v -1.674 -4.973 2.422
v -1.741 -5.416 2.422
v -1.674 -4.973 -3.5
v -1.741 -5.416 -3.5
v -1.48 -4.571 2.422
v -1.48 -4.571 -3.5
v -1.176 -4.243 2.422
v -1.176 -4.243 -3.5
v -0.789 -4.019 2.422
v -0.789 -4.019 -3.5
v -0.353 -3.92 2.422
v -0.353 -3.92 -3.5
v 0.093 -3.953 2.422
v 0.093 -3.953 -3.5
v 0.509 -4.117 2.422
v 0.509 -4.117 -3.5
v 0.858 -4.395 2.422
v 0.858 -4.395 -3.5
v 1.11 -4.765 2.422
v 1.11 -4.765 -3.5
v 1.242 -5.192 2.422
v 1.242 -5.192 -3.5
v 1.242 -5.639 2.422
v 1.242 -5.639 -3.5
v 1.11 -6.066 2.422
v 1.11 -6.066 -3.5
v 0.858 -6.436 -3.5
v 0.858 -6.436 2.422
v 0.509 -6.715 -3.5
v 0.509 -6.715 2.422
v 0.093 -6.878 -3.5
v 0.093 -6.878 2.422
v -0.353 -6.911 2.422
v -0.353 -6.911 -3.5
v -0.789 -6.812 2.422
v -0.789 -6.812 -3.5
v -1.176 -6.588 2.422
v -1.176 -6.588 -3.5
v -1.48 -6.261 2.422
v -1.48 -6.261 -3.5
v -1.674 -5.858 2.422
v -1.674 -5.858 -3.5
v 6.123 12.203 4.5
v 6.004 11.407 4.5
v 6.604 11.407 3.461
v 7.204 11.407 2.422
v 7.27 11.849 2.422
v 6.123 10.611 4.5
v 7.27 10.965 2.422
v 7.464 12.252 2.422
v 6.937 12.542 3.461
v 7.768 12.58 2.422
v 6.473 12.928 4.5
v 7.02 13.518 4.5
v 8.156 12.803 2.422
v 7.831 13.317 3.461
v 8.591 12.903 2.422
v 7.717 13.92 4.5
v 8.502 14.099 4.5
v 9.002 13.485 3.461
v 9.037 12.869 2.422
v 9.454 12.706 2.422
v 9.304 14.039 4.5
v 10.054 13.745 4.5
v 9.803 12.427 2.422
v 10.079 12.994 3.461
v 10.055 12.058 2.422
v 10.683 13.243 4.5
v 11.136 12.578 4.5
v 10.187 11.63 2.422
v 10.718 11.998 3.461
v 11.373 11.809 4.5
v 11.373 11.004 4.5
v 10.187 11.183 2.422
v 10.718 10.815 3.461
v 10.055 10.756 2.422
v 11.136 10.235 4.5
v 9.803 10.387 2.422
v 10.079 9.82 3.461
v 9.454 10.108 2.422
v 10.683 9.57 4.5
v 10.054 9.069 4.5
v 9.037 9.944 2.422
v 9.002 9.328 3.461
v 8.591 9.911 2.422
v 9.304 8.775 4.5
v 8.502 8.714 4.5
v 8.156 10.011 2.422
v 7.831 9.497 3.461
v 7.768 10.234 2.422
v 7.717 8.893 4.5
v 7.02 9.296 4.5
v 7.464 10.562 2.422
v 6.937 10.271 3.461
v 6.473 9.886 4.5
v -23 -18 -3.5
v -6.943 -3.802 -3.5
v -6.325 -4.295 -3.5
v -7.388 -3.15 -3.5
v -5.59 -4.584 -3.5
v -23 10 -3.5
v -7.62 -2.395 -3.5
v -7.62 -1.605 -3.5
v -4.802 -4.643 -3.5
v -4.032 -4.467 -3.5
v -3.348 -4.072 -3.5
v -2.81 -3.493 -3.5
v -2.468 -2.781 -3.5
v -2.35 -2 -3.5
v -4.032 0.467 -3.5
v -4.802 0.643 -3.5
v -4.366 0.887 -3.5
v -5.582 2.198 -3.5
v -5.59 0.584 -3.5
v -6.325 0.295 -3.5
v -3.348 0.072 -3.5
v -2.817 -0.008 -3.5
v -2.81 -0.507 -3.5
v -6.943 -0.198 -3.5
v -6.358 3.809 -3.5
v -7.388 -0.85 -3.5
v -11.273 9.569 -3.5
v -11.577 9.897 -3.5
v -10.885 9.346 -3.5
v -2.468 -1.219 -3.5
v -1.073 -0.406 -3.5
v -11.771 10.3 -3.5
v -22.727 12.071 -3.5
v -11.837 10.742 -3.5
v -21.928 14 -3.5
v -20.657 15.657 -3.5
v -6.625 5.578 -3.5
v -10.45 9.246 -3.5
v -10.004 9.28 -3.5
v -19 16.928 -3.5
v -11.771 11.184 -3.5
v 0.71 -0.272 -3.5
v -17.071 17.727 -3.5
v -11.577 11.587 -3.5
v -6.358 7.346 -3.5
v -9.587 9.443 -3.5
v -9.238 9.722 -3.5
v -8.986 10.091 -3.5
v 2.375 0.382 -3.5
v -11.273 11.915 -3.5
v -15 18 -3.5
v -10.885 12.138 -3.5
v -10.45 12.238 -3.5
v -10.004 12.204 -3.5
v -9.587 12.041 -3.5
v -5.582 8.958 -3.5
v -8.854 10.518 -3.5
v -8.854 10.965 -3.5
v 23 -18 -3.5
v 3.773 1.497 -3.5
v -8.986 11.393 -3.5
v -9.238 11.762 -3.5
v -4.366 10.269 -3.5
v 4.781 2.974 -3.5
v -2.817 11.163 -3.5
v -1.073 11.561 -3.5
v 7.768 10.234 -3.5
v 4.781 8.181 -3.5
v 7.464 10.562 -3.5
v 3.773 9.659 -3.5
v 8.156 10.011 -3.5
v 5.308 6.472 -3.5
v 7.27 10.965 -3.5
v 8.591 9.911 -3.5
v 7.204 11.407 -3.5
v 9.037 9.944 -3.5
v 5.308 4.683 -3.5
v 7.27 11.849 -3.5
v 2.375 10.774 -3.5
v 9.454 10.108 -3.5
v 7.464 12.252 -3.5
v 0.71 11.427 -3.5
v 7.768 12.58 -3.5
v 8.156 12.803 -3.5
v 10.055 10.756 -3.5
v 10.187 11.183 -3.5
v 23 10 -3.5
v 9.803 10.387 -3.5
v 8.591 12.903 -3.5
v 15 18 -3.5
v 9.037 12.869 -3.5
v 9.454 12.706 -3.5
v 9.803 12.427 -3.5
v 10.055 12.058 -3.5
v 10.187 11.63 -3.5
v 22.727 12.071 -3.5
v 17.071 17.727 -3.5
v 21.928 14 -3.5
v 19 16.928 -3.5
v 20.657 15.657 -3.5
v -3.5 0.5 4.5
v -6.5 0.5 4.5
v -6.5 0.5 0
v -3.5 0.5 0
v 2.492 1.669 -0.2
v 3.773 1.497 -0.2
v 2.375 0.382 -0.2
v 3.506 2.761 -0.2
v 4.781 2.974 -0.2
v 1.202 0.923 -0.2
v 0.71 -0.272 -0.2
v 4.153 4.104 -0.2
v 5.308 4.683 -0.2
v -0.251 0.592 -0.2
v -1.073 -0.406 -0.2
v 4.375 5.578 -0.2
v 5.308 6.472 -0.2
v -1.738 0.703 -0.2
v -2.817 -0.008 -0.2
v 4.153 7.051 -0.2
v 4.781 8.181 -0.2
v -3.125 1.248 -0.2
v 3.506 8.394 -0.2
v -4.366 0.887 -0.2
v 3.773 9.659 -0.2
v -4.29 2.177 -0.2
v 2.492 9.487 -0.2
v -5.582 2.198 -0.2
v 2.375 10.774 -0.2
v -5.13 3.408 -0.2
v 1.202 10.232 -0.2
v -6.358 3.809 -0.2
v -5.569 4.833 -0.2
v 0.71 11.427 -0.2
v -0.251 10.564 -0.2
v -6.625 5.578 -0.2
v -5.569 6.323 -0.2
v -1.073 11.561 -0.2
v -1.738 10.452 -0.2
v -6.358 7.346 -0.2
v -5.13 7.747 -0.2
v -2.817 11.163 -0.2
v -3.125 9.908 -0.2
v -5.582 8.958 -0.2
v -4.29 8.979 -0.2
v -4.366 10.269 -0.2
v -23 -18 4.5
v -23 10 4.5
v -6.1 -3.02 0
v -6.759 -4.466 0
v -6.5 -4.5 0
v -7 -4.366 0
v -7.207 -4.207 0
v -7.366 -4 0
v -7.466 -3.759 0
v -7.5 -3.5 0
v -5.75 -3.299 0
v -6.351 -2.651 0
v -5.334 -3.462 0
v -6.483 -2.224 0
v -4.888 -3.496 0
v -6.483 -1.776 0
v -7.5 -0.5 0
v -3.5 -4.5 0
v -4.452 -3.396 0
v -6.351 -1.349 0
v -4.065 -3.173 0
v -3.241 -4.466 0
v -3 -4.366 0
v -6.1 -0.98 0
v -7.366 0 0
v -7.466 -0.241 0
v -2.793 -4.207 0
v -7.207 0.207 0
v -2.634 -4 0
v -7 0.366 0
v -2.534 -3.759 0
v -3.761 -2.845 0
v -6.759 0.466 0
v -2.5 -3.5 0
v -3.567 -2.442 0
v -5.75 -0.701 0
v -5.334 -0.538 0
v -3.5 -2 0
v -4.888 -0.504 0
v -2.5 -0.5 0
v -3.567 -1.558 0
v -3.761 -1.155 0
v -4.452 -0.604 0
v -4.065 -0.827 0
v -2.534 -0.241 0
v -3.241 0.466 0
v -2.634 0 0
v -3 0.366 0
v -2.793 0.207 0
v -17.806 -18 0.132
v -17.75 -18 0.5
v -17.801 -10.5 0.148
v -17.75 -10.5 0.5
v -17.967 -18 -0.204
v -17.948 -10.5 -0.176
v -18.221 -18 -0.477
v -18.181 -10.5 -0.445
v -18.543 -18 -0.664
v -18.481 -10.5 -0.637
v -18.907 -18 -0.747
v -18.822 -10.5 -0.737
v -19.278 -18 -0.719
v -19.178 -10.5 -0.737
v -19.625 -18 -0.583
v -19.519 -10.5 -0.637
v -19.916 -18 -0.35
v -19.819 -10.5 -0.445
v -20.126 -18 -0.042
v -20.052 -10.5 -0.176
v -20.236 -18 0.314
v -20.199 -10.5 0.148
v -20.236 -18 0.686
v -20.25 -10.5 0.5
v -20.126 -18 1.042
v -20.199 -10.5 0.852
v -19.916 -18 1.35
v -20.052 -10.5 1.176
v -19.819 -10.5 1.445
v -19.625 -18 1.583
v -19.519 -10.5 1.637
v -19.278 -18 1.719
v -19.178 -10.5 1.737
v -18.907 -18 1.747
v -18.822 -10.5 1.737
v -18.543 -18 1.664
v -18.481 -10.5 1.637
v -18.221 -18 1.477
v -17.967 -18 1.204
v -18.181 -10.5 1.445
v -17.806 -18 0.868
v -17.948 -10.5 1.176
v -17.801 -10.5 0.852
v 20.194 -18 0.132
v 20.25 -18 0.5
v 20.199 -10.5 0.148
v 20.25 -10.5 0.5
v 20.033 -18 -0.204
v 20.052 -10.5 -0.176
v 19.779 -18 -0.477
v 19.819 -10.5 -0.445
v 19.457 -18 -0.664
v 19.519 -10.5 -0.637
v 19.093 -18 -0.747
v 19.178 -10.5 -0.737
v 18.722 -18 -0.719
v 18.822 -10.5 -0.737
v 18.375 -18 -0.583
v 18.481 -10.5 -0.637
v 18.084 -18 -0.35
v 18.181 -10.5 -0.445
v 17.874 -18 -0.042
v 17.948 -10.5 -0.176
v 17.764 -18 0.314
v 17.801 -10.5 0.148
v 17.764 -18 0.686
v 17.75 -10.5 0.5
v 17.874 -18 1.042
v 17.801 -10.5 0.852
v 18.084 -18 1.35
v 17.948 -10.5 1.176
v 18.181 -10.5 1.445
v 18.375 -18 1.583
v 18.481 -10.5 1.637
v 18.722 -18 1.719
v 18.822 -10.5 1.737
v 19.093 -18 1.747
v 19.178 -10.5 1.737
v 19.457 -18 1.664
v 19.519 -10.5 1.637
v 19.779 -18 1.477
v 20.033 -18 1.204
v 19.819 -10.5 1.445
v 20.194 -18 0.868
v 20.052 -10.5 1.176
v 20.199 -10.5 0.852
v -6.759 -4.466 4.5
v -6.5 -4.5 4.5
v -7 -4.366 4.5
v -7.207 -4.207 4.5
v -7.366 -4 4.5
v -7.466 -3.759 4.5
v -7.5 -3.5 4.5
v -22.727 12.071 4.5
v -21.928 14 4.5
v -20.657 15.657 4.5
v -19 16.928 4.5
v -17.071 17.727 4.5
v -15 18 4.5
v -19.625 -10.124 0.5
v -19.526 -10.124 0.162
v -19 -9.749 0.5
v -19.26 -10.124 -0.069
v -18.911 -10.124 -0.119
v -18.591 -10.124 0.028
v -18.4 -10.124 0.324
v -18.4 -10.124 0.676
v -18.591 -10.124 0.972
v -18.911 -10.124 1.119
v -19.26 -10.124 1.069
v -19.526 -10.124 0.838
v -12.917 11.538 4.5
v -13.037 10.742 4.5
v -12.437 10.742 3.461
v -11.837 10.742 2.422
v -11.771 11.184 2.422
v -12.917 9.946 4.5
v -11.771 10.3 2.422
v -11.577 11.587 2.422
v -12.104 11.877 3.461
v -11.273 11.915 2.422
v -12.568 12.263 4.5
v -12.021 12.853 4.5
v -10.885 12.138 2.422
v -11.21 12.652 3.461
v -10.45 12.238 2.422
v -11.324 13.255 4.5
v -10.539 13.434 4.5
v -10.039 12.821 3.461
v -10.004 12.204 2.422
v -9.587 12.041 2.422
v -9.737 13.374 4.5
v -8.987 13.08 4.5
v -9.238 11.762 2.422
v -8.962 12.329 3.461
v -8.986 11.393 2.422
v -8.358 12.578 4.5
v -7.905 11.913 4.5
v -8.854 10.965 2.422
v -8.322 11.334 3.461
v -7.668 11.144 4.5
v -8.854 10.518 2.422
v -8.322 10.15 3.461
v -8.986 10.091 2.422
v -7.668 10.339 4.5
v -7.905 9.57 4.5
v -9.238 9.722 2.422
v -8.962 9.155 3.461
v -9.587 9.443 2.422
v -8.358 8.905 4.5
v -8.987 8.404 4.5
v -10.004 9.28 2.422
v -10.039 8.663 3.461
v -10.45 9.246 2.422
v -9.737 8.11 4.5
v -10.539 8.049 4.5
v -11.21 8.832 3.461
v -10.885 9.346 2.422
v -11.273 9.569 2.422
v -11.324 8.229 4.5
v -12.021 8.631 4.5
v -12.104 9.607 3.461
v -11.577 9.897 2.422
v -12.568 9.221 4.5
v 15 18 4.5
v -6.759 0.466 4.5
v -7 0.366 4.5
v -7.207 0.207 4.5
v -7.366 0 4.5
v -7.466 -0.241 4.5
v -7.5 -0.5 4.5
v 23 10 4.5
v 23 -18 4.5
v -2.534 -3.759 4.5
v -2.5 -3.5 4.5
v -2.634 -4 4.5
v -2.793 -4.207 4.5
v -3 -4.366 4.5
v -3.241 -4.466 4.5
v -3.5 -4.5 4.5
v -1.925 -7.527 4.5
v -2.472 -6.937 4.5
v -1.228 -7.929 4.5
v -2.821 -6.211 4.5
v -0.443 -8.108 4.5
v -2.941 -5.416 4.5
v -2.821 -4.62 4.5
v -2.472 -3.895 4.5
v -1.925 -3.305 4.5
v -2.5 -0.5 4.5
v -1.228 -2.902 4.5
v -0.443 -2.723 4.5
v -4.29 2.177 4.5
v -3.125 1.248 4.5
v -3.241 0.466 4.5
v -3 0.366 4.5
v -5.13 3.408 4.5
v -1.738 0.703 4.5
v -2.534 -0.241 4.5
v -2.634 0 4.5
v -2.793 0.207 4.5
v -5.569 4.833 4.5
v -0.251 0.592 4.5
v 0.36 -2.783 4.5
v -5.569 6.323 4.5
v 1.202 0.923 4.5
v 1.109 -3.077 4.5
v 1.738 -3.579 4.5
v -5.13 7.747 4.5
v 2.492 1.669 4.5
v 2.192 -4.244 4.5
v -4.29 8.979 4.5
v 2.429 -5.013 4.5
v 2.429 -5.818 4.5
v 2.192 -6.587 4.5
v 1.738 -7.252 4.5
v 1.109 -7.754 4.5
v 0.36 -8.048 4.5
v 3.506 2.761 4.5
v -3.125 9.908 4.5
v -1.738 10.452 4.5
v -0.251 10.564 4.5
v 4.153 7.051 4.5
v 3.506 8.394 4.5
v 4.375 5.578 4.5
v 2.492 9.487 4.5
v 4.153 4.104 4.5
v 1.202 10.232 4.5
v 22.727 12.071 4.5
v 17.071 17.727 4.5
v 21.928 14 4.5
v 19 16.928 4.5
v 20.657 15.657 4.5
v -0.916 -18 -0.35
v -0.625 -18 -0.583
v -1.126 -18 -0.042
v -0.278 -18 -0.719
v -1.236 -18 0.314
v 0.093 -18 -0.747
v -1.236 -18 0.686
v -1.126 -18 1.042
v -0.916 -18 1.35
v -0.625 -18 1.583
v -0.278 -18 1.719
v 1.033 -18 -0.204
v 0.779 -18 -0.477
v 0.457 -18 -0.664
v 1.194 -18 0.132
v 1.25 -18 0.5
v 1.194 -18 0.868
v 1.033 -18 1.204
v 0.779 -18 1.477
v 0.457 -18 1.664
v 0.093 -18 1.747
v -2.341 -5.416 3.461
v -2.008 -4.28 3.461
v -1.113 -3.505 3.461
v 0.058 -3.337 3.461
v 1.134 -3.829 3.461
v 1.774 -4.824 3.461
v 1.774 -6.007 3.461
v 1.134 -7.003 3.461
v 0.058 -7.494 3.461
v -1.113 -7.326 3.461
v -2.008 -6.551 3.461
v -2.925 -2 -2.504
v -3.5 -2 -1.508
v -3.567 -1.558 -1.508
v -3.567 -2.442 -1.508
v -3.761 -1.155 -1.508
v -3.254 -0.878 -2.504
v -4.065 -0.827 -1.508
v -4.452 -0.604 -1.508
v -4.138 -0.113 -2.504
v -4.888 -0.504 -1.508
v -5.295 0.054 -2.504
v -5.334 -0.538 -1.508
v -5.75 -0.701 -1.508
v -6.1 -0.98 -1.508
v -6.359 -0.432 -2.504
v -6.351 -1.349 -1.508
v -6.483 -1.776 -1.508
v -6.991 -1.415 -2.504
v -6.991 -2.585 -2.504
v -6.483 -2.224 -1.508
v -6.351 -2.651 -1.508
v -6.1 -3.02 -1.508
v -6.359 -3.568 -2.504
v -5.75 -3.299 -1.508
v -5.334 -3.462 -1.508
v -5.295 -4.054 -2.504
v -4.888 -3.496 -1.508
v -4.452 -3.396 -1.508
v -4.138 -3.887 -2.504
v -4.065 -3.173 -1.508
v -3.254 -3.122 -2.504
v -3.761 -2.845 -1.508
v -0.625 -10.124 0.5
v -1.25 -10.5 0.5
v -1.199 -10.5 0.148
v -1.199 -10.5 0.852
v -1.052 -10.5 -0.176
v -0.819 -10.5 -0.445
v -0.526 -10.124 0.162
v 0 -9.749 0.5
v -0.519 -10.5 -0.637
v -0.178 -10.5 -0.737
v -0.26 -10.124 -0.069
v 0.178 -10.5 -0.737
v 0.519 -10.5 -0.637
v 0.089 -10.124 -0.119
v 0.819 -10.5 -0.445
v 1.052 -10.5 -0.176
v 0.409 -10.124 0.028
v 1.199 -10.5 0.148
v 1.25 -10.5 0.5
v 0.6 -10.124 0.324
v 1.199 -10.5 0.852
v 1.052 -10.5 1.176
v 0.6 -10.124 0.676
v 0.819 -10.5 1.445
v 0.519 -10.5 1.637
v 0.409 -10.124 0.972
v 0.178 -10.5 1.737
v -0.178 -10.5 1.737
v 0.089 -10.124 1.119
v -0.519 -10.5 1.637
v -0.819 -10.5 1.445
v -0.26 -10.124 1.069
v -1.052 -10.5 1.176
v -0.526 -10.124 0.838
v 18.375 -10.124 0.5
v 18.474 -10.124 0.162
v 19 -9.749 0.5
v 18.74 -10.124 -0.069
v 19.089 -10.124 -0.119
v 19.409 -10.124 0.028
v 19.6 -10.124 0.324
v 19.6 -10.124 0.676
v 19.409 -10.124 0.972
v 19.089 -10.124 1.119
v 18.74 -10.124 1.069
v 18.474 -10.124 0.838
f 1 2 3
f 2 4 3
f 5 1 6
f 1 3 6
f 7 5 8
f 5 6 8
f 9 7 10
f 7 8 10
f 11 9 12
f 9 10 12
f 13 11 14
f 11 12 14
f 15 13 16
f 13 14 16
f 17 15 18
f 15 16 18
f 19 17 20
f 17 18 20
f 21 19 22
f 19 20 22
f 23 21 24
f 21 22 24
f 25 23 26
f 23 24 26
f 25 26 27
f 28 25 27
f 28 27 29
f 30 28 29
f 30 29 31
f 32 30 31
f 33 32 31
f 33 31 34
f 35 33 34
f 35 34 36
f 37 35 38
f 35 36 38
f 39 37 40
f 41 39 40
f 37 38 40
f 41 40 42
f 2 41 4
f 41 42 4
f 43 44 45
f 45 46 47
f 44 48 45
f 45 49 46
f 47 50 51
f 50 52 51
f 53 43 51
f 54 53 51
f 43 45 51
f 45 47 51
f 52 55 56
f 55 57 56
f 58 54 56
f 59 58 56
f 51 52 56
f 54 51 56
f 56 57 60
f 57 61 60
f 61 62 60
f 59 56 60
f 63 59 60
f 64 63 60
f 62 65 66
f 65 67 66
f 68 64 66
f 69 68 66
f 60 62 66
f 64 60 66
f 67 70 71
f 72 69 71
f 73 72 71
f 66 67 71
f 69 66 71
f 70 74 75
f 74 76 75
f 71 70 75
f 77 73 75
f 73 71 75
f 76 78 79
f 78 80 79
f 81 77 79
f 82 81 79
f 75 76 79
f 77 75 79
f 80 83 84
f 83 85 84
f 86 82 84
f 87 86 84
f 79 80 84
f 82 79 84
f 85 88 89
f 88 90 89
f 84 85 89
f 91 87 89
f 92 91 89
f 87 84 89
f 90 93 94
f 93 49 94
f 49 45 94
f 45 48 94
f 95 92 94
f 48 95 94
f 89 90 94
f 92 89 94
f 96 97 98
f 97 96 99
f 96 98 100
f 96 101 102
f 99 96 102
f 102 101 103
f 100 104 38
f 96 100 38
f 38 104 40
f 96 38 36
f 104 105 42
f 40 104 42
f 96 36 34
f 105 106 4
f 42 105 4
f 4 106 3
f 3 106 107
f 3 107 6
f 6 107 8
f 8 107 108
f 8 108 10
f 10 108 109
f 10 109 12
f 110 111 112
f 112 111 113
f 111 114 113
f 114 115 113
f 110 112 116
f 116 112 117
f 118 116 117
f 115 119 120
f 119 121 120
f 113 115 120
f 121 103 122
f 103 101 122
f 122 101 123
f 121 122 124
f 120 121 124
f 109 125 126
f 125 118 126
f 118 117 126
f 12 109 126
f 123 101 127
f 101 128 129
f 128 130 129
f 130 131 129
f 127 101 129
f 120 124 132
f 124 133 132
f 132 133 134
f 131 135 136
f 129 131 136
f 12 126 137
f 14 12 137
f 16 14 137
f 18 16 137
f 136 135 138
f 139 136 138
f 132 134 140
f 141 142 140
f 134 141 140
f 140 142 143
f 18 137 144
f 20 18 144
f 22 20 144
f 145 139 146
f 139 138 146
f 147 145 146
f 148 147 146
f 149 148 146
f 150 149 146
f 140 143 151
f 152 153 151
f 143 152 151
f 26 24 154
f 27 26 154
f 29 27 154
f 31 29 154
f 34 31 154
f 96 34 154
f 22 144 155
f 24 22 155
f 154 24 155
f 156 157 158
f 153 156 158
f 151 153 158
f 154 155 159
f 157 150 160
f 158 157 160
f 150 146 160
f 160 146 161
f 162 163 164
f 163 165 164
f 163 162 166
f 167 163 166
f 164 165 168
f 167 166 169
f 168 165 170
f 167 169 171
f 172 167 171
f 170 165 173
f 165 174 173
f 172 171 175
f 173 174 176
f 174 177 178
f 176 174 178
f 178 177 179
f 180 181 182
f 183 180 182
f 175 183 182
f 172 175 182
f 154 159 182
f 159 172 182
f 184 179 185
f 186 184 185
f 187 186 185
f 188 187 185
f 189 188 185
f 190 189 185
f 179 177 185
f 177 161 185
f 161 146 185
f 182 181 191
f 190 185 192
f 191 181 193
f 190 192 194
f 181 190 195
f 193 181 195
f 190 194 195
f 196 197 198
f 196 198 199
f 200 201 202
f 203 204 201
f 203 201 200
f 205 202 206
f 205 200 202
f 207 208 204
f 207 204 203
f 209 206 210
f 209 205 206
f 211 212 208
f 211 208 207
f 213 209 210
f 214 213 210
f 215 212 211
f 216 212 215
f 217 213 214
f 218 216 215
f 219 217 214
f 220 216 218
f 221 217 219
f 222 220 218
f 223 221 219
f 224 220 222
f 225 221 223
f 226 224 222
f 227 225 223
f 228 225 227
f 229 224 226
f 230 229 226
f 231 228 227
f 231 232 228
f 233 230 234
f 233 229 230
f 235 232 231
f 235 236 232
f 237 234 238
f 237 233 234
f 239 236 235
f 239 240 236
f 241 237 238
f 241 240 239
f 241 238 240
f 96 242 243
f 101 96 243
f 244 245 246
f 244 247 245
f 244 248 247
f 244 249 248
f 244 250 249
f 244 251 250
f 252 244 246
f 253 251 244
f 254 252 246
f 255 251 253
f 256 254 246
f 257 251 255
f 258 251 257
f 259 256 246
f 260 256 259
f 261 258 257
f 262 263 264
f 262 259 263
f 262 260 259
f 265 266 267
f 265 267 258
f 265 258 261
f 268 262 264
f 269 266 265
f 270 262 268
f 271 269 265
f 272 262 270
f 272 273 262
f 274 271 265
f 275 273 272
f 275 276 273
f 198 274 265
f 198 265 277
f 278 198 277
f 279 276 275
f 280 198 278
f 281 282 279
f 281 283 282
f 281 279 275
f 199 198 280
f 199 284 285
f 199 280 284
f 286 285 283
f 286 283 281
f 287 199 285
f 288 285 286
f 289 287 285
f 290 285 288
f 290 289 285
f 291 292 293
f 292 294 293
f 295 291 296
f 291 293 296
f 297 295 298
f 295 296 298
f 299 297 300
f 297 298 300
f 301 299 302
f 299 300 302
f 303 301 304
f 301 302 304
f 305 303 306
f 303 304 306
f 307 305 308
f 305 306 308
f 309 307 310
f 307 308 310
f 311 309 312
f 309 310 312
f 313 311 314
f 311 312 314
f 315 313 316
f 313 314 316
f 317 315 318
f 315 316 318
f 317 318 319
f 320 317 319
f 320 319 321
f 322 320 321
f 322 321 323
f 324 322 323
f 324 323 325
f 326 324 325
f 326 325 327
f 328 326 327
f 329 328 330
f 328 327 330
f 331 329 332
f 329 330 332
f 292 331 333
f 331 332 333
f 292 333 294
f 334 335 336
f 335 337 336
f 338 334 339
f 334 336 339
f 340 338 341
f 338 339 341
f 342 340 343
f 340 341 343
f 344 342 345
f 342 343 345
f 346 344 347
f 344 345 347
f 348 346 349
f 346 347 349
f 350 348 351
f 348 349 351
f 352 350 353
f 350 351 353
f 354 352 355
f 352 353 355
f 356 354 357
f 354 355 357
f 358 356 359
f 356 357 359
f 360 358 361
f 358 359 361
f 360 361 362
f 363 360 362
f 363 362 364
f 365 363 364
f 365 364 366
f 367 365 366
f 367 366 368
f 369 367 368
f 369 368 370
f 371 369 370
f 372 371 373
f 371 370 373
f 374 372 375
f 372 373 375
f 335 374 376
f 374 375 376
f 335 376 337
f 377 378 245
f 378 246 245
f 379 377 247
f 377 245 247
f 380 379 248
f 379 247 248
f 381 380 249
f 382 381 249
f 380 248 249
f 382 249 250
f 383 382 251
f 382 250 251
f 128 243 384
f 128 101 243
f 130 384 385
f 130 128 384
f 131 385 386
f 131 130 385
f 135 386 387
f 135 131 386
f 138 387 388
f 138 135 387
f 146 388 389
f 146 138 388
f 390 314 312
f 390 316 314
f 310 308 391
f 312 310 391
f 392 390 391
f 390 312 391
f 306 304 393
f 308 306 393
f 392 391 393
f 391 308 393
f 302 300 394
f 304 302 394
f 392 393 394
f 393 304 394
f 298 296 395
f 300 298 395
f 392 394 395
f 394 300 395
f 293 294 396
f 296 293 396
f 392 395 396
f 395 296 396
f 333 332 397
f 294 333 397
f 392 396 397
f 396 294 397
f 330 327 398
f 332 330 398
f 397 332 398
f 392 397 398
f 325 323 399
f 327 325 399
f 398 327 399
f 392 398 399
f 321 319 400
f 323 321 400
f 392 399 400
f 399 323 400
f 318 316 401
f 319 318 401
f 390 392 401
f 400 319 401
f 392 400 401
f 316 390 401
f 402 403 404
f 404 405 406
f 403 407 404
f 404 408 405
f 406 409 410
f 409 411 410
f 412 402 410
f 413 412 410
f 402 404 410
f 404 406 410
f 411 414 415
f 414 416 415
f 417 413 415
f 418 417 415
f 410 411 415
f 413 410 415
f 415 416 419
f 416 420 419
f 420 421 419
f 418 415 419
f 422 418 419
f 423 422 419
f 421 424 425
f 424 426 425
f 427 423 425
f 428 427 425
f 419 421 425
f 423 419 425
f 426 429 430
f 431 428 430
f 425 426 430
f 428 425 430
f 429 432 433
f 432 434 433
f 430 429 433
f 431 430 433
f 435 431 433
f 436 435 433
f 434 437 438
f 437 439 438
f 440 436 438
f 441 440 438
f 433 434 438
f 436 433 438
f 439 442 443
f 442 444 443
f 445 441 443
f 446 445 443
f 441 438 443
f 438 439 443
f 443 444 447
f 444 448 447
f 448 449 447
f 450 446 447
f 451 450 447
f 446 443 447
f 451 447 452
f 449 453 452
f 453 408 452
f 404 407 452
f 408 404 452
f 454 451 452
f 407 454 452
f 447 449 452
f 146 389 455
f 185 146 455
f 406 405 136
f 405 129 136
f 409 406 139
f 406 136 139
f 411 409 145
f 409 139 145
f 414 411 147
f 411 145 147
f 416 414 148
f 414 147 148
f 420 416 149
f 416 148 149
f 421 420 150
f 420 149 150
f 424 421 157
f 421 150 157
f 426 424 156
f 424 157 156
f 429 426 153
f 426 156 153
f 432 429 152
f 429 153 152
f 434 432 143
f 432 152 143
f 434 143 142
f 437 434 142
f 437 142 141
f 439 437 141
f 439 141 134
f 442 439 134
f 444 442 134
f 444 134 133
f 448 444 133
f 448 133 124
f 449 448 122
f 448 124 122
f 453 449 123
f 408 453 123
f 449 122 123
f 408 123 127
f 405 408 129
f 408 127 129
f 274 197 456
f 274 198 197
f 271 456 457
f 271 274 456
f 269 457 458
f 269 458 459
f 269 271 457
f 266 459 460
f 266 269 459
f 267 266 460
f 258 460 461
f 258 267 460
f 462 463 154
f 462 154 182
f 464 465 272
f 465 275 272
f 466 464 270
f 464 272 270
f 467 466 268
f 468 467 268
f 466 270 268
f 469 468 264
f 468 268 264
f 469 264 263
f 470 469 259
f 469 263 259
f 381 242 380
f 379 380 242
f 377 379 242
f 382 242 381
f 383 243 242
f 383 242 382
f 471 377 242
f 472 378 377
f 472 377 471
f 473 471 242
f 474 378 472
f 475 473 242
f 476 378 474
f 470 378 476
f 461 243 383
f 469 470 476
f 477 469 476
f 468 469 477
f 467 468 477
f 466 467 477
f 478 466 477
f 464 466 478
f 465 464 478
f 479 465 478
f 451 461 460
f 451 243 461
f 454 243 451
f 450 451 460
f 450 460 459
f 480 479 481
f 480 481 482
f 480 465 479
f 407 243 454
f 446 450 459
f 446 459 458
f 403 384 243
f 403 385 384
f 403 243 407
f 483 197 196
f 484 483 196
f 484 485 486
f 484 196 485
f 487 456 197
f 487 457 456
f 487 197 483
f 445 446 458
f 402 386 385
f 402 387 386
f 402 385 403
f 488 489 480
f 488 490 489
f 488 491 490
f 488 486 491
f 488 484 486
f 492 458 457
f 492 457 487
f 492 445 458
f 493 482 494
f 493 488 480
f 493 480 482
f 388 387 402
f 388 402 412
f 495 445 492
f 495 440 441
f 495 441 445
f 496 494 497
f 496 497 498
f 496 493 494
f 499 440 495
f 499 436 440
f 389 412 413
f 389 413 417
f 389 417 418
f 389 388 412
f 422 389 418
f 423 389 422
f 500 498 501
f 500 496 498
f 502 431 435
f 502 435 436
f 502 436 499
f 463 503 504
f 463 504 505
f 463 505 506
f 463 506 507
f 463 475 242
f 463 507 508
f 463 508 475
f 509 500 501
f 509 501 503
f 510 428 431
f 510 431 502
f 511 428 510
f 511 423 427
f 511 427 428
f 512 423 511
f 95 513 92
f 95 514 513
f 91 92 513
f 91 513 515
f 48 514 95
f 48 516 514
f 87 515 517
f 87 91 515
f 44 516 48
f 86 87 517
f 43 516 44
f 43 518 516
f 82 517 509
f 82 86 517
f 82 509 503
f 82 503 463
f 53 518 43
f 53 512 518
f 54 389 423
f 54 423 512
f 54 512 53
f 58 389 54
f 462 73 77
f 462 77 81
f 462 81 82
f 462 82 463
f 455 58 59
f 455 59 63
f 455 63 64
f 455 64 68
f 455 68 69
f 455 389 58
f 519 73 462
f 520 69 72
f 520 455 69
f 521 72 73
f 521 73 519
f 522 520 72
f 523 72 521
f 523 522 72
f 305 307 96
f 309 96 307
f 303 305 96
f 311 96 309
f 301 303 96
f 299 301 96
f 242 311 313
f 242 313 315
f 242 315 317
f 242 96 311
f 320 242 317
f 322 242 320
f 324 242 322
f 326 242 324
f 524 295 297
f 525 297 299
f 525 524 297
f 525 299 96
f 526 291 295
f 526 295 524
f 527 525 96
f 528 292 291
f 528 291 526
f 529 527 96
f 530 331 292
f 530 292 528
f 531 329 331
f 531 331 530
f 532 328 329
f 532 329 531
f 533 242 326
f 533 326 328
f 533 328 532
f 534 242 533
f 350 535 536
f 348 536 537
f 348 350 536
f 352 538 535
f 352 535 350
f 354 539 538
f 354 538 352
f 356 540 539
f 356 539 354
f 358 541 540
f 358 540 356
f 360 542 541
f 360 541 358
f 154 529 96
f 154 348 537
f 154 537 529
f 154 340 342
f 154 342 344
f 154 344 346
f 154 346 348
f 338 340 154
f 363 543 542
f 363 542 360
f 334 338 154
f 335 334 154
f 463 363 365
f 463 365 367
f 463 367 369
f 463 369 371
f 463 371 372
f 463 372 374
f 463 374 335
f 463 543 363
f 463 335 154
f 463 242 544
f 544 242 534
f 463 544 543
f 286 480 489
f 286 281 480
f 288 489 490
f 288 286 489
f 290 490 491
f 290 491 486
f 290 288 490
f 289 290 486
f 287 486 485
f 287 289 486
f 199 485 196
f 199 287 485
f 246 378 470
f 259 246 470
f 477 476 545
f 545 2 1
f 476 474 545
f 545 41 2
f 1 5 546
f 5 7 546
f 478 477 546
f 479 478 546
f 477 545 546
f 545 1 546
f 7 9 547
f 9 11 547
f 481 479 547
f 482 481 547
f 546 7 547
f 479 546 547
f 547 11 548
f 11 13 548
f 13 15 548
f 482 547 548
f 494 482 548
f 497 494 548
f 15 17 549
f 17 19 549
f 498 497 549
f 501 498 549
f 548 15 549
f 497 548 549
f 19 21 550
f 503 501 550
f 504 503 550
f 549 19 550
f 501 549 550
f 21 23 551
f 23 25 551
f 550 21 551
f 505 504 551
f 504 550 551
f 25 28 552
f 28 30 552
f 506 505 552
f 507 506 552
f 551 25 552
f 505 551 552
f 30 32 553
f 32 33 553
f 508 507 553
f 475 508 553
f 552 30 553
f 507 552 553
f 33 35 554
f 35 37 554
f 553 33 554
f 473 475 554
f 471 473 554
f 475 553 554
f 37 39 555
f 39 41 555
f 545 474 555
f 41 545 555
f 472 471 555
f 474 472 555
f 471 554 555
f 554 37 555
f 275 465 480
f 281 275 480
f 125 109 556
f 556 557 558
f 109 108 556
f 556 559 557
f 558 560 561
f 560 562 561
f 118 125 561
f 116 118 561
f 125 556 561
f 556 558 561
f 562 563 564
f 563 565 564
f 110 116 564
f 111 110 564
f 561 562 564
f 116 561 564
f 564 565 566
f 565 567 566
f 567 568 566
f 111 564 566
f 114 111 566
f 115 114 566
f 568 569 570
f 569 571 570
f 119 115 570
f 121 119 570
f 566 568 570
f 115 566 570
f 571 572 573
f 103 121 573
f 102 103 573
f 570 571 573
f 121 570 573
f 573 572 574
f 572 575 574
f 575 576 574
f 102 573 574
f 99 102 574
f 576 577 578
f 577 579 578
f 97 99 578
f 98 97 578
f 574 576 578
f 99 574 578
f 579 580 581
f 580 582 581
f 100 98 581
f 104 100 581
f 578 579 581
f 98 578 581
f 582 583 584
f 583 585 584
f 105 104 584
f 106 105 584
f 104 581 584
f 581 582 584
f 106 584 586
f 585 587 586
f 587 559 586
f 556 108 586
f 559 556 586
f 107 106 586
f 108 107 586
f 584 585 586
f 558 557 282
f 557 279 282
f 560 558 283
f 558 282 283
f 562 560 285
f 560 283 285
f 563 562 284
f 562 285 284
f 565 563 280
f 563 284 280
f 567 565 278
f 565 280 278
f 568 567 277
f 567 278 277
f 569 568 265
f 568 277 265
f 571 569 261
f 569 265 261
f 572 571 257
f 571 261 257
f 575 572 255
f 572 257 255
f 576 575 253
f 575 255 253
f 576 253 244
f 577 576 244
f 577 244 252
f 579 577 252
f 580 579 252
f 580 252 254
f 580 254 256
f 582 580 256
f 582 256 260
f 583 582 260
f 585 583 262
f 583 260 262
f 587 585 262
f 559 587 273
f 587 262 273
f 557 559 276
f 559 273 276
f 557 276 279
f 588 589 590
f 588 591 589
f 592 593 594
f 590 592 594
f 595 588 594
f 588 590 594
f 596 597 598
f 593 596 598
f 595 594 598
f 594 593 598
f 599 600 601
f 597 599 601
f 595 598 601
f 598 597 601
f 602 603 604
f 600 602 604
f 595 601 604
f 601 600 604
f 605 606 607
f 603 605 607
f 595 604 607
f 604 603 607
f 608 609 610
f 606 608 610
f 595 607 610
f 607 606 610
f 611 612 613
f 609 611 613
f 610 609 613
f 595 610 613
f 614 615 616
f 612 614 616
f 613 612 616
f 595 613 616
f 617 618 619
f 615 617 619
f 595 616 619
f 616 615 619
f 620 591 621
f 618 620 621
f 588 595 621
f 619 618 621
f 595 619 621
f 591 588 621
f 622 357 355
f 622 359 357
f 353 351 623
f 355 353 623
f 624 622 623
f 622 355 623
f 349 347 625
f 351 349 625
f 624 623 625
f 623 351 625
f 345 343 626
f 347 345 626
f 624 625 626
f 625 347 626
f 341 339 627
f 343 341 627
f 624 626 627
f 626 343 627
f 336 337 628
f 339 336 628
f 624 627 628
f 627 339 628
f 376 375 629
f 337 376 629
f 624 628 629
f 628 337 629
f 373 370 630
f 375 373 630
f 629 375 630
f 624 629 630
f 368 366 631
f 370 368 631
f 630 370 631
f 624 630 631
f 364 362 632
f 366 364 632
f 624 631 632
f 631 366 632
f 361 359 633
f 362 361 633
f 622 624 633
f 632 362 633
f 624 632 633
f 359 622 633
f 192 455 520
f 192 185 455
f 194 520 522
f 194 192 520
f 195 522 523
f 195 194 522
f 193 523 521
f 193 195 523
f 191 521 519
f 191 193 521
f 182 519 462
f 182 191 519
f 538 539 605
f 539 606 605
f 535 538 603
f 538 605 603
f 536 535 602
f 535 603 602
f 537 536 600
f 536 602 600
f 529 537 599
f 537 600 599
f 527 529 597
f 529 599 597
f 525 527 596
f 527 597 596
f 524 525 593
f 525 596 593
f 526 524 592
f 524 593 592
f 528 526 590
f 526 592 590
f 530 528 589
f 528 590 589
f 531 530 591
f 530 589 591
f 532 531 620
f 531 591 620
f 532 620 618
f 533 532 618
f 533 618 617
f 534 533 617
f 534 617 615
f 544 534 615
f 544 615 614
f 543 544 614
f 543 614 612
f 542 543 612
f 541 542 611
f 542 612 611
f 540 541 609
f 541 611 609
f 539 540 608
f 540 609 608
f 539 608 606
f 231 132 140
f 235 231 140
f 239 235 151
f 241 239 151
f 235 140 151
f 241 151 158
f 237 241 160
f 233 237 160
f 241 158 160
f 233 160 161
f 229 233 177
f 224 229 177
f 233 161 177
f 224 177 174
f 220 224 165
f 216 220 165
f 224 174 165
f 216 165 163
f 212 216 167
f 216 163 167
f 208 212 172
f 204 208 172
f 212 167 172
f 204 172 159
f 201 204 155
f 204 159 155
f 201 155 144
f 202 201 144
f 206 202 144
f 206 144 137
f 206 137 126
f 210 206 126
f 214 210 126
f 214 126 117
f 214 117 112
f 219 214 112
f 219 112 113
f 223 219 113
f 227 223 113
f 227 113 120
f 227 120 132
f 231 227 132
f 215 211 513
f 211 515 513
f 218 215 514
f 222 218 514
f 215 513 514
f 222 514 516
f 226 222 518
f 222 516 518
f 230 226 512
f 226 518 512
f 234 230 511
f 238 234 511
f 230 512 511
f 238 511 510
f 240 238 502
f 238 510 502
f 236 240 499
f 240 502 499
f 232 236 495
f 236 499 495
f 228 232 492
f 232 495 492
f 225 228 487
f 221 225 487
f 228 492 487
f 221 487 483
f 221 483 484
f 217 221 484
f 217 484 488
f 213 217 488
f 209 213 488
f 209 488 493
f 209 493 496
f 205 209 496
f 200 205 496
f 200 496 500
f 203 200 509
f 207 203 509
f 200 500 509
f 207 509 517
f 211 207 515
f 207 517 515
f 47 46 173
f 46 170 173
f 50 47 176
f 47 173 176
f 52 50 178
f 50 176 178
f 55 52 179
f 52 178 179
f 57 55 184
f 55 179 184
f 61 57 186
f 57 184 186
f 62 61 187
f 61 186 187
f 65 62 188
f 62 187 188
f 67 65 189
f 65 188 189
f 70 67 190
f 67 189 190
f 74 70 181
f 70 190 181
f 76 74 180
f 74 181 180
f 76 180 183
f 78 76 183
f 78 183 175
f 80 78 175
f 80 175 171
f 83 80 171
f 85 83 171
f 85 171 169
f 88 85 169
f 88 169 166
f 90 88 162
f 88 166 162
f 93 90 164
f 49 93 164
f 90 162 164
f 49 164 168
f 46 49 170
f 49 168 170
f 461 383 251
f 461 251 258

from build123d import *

# Parameters (mm, degrees)
SKETCH1_W                     = 46
SKETCH1_H                     = 36
BOSS_EXTRUDE1_DEPTH           = 8
M3X0_5_TAPPED_HOLE1_D         = 2.5
M3X0_5_TAPPED_HOLE1_DEPTH     = 7.5
M3X0_5_TAPPED_HOLE1_TIP       = 0.751075774
M3X0_5_TAPPED_HOLE2_D         = 2.5
M3X0_5_TAPPED_HOLE2_DEPTH     = 7.5
M3X0_5_TAPPED_HOLE2_TIP       = 0.751075774
FILLET2_R                     = 8
SKETCH13_W                    = 5
SKETCH13_H                    = 5
CUT_EXTRUDE1_DEPTH            = 4.5
CSK_FOR_M3_SFHCS1_D           = 3
CSK_FOR_M3_SFHCS1_DEPTH       = 9.5
CSK_FOR_M3_SFHCS1_CSINK_D     = 5.3
CSK_FOR_M3_SFHCS1_CSINK_ANGLE = 60
CSK_FOR_M3_SFHCS1_TIP         = 0.901290929
FILLET3_R                     = 1
HOLE1_D                       = 10
HOLE1_CBORE_D                 = 12
HOLE1_CBORE_DEPTH             = 3.3
CSK_FOR_M3_SFHCS2_D           = 3
CSK_FOR_M3_SFHCS2_DEPTH       = 9.5
CSK_FOR_M3_SFHCS2_CSINK_D     = 5.4
CSK_FOR_M3_SFHCS2_CSINK_ANGLE = 60
CSK_FOR_M3_SFHCS2_TIP         = 0.901290929


with BuildPart() as part:
    # Sketch1 → Boss-Extrude1 (new body)
    with BuildSketch(Plane.XY.offset(4.5)):
        Rectangle(SKETCH1_W, SKETCH1_H)
    extrude(amount=-BOSS_EXTRUDE1_DEPTH)

    # M3x0.5 Tapped Hole1
    with Locations(Plane(origin=(0, -18, 0), x_dir=(-1, 0, 0), z_dir=(0, -1, 0))):
        with Locations((0, -0.5)):
            Hole(M3X0_5_TAPPED_HOLE1_D / 2, depth=M3X0_5_TAPPED_HOLE1_DEPTH)
            with Locations((0, 0, -(M3X0_5_TAPPED_HOLE1_DEPTH + M3X0_5_TAPPED_HOLE1_TIP / 2))):  # 118° drill point
                Cone(0, M3X0_5_TAPPED_HOLE1_D / 2, M3X0_5_TAPPED_HOLE1_TIP, mode=Mode.SUBTRACT)

    # M3x0.5 Tapped Hole2
    with Locations(Plane(origin=(0, -18, 0), x_dir=(-1, 0, 0), z_dir=(0, -1, 0))):
        with Locations((-19, -0.5), (19, -0.5)):
            Hole(M3X0_5_TAPPED_HOLE2_D / 2, depth=M3X0_5_TAPPED_HOLE2_DEPTH)
            with Locations((0, 0, -(M3X0_5_TAPPED_HOLE2_DEPTH + M3X0_5_TAPPED_HOLE2_TIP / 2))):  # 118° drill point
                Cone(0, M3X0_5_TAPPED_HOLE2_D / 2, M3X0_5_TAPPED_HOLE2_TIP, mode=Mode.SUBTRACT)

    # Fillet2
    fillet2_edges = [part.edges().sort_by_distance(p)[0] for p in [
        (-23, 18, 0.5),
        (23, 18, 0.5),
    ]]
    fillet(fillet2_edges, radius=FILLET2_R)

    # Sketch13 → Cut-Extrude1 (cut)
    with BuildSketch(Plane.XY.offset(4.5)):
        with Locations((-5, -2)):
            Rectangle(SKETCH13_W, SKETCH13_H)
    extrude(amount=-CUT_EXTRUDE1_DEPTH, mode=Mode.SUBTRACT)

    # CSK for M3 SFHCS1
    with Locations(Plane(origin=(-5, -2, -3.5), x_dir=(-1, 0, 0), z_dir=(0, 0, -1))):
        with Locations((0, 0)):
            CounterSinkHole(CSK_FOR_M3_SFHCS1_D / 2, CSK_FOR_M3_SFHCS1_CSINK_D / 2, depth=CSK_FOR_M3_SFHCS1_DEPTH, counter_sink_angle=CSK_FOR_M3_SFHCS1_CSINK_ANGLE)
            with Locations((0, 0, -(CSK_FOR_M3_SFHCS1_DEPTH + CSK_FOR_M3_SFHCS1_TIP / 2))):  # 118° drill point
                Cone(0, CSK_FOR_M3_SFHCS1_D / 2, CSK_FOR_M3_SFHCS1_TIP, mode=Mode.SUBTRACT)

    # Fillet3
    fillet3_edges = [part.edges().sort_by_distance(p)[0] for p in [
        (-2.5, 0.5, 2.25),
        (-2.5, -4.5, 2.25),
        (-7.5, -4.5, 2.25),
        (-7.5, 0.5, 2.25),
    ]]
    fillet(fillet3_edges, radius=FILLET3_R)

    # Hole1 (through all)
    with Locations(Plane(origin=(0, 0, -3.5), x_dir=(-1, 0, 0), z_dir=(0, 0, -1))):
        with Locations((0.625, 5.577722283)):
            CounterBoreHole(HOLE1_D / 2, HOLE1_CBORE_D / 2, HOLE1_CBORE_DEPTH)

    # CSK for M3 SFHCS2
    with Locations(Plane.XY.offset(4.5)):
        with Locations((-10.337423522, 10.741909474), (8.703529058, 11.40683419), (-0.241105536, -5.415576815)):
            CounterSinkHole(CSK_FOR_M3_SFHCS2_D / 2, CSK_FOR_M3_SFHCS2_CSINK_D / 2, depth=CSK_FOR_M3_SFHCS2_DEPTH, counter_sink_angle=CSK_FOR_M3_SFHCS2_CSINK_ANGLE)
            with Locations((0, 0, -(CSK_FOR_M3_SFHCS2_DEPTH + CSK_FOR_M3_SFHCS2_TIP / 2))):  # 118° drill point
                Cone(0, CSK_FOR_M3_SFHCS2_D / 2, CSK_FOR_M3_SFHCS2_TIP, mode=Mode.SUBTRACT)


solid = part.part
